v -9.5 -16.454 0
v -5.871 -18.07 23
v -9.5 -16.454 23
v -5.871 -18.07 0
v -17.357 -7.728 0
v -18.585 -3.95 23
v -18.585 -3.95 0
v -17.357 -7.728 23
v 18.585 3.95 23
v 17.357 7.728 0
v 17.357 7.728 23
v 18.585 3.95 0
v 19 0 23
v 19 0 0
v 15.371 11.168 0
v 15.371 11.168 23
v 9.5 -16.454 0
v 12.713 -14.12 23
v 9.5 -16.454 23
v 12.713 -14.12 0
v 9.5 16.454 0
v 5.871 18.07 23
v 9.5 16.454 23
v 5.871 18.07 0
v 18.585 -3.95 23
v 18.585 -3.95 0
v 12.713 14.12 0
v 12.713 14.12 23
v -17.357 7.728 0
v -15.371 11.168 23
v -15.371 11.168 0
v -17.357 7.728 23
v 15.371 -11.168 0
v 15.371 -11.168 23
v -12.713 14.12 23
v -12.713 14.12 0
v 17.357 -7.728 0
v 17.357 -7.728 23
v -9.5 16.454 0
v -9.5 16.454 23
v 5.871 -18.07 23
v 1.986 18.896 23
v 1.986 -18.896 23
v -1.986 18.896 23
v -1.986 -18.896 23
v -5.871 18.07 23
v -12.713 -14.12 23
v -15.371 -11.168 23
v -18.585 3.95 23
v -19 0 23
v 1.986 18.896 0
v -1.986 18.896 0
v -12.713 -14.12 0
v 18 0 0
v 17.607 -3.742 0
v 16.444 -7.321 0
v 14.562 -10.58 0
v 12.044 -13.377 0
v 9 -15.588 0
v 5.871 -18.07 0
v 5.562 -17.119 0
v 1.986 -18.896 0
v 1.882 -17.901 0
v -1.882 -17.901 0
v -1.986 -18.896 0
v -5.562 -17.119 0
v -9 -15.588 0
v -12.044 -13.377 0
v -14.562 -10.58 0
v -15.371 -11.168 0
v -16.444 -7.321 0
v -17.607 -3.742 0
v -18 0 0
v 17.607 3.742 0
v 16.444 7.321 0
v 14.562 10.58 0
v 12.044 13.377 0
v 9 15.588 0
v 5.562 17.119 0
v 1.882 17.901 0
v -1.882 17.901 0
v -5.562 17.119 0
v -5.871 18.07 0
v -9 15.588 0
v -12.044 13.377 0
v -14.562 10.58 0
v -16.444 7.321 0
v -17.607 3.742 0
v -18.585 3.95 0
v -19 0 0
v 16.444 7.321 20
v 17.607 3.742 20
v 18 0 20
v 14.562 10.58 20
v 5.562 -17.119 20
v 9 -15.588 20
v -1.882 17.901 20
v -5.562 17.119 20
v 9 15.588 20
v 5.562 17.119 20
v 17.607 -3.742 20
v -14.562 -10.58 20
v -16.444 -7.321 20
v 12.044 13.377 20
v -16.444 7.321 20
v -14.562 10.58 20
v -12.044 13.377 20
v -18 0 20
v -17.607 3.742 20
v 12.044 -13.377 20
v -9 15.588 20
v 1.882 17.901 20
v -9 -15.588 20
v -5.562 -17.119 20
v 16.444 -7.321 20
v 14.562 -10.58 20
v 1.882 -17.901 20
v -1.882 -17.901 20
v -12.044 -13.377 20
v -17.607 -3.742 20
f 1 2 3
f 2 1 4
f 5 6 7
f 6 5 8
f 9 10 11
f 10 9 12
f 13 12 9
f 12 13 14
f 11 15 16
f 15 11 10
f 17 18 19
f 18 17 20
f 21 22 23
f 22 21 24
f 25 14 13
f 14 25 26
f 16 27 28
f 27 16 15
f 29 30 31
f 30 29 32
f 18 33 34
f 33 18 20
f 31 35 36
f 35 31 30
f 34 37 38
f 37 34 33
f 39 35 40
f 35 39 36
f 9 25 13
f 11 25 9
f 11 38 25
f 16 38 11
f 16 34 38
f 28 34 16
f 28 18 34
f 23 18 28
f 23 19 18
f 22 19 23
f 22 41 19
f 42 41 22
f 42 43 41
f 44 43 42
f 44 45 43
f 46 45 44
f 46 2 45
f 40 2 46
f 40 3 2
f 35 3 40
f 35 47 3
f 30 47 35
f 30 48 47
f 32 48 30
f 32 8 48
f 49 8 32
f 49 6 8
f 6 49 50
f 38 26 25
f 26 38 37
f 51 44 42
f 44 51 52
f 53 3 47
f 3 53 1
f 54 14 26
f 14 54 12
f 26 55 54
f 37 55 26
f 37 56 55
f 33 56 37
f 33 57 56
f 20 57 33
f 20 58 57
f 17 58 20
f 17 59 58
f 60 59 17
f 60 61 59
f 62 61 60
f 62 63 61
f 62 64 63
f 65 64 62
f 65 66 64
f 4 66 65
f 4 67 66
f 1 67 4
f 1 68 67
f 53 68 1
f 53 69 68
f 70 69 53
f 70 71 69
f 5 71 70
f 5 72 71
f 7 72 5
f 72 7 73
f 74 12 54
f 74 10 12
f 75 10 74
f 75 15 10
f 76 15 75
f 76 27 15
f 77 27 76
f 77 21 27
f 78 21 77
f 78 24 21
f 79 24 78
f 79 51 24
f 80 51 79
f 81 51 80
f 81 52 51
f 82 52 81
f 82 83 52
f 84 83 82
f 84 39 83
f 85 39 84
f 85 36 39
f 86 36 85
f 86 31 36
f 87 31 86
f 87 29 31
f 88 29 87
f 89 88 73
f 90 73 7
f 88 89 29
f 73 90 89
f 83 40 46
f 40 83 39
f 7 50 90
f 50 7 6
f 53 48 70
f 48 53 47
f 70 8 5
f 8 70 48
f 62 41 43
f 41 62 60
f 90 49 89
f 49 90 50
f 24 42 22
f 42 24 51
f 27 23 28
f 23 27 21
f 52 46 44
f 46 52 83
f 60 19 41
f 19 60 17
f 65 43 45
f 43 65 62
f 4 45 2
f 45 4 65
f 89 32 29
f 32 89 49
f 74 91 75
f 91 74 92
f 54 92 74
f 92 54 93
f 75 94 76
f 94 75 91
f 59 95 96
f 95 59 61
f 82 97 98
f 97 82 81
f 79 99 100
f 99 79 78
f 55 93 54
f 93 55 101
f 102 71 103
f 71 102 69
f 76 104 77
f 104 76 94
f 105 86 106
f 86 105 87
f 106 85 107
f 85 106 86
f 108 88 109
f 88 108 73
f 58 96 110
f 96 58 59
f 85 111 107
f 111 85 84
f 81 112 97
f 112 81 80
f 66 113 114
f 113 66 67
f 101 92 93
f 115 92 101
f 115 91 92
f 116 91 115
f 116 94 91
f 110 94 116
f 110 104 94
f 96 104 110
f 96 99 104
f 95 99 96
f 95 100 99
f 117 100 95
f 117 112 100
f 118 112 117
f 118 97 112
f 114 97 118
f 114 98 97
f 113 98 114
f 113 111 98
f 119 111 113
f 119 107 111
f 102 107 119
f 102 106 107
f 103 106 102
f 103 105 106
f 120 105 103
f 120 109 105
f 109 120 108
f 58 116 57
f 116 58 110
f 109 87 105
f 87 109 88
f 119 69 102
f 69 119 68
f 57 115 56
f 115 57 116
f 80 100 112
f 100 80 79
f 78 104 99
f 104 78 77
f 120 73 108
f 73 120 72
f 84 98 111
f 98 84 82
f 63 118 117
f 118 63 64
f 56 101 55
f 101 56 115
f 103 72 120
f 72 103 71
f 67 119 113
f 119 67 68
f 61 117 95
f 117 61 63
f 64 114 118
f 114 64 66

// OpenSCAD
od = 38;
id = 36;
hd = 6;

base_h = 3;
cup_h = 20;


difference() {
cylinder(d=od, h=base_h+cup_h);
cylinder(d=id, h=cup_h);
//cylinder(d=hd, h=base_h+cup_h);
}
